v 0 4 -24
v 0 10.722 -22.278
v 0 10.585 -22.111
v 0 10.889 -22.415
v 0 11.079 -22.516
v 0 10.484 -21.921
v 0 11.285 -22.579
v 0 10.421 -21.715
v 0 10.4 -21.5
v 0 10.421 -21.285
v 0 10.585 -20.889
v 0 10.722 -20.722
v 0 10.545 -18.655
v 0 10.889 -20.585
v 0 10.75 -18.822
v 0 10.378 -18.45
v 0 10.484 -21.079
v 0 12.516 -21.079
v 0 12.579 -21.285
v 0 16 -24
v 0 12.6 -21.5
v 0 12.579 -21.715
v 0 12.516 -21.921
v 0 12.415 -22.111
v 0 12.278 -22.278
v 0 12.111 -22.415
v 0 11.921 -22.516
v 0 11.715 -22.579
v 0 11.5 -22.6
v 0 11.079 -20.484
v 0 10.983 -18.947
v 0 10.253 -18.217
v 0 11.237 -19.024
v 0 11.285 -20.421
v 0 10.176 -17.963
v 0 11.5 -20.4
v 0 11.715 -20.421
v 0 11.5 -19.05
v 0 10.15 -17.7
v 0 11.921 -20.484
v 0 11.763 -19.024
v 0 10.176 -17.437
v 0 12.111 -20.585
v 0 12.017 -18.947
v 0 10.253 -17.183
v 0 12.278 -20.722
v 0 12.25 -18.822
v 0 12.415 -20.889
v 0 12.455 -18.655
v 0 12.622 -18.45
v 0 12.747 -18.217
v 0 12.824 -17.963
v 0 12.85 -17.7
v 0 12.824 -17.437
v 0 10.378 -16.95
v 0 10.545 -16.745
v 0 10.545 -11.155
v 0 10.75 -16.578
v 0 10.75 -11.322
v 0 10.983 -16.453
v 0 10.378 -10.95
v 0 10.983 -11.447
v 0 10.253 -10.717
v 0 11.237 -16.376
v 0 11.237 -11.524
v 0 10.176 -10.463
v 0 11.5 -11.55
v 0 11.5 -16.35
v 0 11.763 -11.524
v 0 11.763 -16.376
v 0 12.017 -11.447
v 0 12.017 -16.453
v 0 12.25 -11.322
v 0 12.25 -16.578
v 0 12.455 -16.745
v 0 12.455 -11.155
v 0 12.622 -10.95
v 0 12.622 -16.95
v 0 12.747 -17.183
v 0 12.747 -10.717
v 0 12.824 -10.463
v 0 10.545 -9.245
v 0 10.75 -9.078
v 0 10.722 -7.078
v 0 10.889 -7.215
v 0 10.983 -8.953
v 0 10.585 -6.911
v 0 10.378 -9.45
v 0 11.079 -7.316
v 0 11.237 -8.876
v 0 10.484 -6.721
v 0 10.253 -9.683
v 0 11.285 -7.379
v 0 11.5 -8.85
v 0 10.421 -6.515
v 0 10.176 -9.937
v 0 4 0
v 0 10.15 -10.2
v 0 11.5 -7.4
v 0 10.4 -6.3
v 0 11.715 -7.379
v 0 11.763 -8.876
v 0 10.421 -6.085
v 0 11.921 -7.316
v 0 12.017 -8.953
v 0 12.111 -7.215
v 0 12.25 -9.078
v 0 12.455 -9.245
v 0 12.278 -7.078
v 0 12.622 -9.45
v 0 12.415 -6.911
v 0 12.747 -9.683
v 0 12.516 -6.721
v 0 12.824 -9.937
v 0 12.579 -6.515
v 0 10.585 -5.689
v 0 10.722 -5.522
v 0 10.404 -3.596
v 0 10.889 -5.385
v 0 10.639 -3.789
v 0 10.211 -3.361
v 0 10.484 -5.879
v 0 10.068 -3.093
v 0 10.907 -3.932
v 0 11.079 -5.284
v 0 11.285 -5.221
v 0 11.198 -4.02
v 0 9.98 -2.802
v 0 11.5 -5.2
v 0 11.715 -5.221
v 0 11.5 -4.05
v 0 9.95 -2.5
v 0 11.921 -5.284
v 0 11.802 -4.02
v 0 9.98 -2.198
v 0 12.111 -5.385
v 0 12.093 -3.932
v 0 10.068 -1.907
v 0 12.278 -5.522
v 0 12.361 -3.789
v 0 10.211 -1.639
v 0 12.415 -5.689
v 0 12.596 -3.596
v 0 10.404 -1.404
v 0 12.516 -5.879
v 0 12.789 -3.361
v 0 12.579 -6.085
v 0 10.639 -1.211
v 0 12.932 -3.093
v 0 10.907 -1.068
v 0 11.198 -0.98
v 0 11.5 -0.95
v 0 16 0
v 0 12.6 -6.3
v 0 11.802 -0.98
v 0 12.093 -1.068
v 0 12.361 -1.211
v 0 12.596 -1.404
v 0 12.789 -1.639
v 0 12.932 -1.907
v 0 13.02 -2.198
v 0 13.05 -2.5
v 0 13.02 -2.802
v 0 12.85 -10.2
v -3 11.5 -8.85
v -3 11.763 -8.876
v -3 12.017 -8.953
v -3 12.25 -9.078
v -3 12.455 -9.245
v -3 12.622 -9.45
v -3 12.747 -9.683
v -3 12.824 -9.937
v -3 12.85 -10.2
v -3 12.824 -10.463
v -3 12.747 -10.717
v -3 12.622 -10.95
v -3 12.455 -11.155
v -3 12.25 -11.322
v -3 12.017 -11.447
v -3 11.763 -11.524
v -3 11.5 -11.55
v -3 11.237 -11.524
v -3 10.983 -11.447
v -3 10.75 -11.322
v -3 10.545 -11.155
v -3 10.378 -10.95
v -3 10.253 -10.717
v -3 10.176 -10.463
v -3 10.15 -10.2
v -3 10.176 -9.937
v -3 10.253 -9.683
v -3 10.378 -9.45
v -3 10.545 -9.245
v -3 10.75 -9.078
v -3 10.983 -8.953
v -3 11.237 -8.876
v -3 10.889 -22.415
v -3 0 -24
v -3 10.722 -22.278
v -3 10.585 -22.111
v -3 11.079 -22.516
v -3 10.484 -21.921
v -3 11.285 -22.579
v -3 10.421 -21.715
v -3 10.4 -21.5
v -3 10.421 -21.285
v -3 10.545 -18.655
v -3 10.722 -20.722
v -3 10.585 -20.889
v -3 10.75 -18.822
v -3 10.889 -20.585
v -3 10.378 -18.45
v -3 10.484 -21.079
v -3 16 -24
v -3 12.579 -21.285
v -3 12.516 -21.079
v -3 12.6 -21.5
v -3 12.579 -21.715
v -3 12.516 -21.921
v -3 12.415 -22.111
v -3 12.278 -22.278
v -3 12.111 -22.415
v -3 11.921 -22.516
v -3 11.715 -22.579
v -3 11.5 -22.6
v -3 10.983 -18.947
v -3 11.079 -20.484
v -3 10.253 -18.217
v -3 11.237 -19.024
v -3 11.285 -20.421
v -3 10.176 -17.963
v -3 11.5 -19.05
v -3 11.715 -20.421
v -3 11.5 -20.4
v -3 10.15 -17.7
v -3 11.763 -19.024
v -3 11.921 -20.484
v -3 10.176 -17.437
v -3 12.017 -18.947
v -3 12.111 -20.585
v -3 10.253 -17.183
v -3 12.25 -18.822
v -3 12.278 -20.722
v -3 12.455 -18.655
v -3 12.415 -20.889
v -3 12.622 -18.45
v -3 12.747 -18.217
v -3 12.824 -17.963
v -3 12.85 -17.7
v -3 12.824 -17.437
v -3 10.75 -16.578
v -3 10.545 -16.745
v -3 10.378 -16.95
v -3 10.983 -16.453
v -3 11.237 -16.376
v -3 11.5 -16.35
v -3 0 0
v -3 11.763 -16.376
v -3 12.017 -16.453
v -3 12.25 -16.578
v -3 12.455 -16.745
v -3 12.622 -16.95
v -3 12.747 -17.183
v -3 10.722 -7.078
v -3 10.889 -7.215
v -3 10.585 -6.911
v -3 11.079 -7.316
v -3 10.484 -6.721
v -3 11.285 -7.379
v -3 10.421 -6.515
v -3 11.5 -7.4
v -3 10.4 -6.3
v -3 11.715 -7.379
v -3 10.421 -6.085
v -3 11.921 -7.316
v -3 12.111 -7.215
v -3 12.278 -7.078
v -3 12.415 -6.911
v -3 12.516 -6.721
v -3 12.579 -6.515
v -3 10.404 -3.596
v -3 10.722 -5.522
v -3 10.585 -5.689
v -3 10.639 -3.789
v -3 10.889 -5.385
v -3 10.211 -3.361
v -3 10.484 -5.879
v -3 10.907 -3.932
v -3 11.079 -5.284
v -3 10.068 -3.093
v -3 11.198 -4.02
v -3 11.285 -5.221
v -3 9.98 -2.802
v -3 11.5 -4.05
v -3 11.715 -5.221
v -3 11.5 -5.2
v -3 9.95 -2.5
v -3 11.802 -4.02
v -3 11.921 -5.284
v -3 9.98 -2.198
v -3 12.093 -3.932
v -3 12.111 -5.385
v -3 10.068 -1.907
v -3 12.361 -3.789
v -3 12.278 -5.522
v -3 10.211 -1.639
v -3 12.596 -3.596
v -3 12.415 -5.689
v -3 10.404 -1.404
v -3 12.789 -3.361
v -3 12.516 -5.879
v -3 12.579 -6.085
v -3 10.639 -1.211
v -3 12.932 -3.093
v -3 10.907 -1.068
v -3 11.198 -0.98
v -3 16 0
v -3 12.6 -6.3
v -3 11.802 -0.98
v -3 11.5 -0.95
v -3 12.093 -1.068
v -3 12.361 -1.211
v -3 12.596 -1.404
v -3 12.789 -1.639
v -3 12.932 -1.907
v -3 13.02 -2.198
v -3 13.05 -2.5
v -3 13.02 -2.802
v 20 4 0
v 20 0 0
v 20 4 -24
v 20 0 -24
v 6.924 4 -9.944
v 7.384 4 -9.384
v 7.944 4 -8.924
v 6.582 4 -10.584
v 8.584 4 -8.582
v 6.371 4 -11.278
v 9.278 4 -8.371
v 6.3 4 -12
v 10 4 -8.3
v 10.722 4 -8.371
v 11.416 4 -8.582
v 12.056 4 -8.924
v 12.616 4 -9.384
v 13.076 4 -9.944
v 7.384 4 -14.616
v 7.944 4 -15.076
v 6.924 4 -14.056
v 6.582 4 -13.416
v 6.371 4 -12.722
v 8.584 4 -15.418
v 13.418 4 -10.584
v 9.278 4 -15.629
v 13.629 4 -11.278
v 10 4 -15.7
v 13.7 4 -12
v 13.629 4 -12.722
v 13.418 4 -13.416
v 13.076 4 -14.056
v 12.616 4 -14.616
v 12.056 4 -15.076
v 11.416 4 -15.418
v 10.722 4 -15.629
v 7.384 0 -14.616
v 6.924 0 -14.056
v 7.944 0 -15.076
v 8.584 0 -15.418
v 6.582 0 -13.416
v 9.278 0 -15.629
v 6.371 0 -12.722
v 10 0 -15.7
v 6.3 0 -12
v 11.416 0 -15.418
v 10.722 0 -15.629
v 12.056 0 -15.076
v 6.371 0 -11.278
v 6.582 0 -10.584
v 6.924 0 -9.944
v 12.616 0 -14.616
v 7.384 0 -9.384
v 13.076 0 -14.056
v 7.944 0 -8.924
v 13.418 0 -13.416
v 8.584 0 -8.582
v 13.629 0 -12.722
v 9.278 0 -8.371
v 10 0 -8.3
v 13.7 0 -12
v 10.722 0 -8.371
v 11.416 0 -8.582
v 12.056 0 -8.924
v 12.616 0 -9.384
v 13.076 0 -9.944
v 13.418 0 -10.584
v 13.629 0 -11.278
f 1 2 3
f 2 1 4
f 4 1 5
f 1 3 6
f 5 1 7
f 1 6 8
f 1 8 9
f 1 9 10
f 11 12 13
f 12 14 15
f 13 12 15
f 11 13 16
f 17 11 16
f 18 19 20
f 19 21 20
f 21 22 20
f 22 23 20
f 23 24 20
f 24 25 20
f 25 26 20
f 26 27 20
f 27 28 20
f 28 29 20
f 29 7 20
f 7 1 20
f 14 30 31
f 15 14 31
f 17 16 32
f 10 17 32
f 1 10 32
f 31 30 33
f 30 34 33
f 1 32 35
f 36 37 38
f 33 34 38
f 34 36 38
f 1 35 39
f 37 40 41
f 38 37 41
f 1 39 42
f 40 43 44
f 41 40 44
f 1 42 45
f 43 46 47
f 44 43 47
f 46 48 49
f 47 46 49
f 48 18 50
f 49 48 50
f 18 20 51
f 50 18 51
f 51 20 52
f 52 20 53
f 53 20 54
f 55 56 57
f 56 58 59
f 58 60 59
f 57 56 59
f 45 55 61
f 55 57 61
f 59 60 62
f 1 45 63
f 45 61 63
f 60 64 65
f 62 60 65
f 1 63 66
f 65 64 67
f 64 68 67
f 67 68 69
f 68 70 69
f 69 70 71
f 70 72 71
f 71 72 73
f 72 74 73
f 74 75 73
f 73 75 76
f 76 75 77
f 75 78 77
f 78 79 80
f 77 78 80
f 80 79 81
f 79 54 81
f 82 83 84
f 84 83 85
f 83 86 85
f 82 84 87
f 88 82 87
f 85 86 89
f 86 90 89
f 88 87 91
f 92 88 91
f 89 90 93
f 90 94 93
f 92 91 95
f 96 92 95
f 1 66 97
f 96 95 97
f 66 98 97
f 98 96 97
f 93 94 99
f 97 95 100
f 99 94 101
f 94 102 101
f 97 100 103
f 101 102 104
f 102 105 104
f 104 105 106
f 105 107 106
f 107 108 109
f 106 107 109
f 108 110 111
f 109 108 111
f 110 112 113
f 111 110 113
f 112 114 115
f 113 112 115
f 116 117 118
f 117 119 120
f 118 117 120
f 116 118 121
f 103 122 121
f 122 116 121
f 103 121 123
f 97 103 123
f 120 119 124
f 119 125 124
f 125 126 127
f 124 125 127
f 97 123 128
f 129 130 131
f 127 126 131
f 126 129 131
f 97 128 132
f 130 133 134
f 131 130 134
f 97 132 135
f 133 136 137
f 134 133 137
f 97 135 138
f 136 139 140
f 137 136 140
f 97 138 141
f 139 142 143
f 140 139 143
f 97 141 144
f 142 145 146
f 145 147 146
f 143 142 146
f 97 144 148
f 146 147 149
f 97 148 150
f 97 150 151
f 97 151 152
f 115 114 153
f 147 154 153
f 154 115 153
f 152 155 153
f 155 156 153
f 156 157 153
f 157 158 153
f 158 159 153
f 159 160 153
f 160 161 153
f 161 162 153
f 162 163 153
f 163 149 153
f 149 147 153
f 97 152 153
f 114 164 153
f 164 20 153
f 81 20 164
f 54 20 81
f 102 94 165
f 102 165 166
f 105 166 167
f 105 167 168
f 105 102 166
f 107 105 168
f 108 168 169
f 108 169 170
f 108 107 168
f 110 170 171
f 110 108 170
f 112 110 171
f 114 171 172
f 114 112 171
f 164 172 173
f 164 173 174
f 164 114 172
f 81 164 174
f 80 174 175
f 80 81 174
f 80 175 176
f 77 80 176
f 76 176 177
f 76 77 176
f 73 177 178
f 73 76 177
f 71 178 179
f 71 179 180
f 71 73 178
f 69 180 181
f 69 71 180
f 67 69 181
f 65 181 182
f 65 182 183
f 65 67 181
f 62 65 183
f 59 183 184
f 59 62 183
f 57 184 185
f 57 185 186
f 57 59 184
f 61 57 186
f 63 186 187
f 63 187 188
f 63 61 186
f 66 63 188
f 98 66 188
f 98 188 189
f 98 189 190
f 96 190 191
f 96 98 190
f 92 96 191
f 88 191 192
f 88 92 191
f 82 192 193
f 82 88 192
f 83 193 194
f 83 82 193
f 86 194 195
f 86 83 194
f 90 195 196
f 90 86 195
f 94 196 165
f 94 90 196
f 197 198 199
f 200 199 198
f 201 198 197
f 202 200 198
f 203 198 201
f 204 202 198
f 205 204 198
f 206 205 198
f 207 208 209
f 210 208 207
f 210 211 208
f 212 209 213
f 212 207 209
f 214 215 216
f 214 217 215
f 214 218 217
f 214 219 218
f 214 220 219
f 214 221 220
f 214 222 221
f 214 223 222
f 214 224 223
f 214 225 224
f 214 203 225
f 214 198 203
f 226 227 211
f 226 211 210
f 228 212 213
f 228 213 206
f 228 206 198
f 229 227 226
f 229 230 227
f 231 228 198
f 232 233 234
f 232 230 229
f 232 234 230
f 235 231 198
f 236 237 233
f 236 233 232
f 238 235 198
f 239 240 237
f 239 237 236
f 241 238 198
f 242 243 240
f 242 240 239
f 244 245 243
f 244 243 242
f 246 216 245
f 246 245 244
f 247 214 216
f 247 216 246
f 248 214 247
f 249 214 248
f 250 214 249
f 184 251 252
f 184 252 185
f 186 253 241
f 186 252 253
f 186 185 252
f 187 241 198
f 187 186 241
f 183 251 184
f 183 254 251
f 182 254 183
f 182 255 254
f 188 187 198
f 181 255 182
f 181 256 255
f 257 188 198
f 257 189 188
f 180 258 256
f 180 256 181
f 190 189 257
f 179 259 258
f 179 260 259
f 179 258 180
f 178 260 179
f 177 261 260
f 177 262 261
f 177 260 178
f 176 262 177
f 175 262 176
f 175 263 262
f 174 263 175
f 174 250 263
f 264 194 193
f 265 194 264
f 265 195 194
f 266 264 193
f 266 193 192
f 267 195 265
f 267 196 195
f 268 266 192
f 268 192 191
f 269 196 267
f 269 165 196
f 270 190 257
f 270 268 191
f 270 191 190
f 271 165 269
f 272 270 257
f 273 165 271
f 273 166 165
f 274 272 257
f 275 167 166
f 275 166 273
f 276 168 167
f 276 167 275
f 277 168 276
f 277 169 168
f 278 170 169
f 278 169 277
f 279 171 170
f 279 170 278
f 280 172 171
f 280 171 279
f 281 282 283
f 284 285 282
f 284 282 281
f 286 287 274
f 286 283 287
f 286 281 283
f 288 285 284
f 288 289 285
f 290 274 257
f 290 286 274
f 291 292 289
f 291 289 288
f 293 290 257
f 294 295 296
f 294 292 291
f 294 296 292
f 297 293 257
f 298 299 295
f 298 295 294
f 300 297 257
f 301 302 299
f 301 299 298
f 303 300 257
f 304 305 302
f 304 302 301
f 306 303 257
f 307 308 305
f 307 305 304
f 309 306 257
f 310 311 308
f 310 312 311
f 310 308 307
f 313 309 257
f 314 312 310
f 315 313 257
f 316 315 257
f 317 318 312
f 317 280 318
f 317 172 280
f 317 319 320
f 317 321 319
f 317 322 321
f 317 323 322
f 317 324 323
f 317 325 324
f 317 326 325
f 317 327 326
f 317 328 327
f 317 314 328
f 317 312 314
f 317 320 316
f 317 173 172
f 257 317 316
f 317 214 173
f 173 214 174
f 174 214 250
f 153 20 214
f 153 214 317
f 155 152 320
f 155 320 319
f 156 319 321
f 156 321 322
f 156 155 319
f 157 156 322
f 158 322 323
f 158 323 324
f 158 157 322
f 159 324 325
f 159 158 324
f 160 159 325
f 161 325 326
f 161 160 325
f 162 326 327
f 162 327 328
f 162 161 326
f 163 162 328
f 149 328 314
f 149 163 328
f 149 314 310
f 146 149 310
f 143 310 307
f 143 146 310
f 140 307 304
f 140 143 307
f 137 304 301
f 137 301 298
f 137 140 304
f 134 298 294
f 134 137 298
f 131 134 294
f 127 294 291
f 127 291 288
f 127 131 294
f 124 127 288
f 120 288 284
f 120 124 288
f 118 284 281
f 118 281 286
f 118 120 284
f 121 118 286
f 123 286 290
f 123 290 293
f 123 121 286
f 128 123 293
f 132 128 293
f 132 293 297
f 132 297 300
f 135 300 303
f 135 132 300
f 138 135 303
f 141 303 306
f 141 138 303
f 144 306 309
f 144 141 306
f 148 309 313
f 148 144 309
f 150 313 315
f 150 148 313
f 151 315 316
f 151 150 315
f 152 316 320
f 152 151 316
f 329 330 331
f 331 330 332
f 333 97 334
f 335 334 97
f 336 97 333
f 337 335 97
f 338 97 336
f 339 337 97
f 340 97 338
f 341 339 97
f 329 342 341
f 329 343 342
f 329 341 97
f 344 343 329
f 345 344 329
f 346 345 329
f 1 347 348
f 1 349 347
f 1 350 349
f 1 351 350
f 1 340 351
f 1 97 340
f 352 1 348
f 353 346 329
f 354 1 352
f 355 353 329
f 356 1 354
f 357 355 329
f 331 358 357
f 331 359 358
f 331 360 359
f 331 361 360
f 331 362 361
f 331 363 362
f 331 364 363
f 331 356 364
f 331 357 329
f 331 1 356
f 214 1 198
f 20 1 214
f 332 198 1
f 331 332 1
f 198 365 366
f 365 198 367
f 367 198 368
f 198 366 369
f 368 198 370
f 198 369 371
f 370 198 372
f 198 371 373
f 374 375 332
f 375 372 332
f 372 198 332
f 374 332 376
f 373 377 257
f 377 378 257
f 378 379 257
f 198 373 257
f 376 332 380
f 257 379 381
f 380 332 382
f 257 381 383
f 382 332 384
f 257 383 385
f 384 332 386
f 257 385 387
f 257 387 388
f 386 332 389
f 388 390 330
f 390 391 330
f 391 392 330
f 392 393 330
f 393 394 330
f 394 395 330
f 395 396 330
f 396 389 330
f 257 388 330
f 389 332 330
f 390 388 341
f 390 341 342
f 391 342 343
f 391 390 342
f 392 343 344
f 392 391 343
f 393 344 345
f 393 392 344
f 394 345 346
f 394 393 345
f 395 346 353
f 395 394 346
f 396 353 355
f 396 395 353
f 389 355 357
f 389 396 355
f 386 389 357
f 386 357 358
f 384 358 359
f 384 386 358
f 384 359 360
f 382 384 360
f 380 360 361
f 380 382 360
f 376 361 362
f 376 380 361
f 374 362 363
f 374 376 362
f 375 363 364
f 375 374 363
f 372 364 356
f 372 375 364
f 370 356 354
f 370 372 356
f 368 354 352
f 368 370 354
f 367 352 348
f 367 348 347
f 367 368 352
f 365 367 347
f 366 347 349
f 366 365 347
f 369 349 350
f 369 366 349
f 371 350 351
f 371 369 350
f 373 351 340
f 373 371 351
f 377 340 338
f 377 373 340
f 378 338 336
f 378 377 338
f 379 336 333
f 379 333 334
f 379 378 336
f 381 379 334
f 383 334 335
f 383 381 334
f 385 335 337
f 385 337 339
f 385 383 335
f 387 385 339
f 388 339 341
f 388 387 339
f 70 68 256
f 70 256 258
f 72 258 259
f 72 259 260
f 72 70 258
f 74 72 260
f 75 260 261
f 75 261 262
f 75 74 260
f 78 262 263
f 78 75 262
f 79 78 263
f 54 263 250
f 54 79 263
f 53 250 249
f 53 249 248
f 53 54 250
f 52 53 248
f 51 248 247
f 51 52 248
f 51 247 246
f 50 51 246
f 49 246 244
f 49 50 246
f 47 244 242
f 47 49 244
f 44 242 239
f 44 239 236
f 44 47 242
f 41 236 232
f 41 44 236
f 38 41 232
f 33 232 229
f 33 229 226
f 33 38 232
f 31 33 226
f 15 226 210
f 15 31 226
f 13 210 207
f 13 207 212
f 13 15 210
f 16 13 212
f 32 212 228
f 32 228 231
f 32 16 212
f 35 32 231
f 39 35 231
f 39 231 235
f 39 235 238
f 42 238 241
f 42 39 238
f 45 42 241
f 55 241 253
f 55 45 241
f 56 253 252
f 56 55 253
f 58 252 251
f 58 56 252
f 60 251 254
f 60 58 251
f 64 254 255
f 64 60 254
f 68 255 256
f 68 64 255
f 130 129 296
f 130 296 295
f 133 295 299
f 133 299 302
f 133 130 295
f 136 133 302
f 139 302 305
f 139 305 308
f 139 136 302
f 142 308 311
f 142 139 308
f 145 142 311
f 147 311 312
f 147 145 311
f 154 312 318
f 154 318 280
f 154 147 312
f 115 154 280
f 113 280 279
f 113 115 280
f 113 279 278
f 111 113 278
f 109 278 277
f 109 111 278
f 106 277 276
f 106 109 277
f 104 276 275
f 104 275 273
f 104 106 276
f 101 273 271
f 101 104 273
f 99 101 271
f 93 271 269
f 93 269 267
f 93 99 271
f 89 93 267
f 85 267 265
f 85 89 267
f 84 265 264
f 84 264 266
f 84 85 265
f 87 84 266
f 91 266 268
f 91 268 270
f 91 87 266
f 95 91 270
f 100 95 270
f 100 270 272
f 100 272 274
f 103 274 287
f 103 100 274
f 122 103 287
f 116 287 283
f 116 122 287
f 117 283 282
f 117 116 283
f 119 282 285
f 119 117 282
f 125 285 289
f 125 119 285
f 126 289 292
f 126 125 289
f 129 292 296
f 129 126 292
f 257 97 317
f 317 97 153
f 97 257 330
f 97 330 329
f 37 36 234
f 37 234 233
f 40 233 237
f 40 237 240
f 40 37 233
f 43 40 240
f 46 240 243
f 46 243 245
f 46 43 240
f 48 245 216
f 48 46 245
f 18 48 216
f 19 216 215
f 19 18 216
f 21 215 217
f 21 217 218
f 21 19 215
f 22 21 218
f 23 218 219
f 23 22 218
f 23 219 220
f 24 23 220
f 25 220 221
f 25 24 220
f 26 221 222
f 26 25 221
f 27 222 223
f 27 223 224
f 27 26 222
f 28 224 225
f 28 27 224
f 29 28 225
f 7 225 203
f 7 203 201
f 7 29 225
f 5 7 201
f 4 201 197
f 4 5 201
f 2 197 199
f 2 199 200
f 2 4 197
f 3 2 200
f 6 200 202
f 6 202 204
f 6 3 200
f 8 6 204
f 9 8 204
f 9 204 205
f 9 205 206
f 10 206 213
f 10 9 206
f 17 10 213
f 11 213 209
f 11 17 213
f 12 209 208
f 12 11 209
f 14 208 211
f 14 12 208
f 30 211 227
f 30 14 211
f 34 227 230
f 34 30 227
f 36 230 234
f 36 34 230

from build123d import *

# Parameters (mm, degrees)
SKETCH_1_W      = 20
SKETCH_1_H      = 24
SKETCH_1_R      = 3.7
EXTRUDE_1_DEPTH = 4
SKETCH_2_W      = 24
SKETCH_2_H      = 16
SKETCH_2_R      = 1.1
SKETCH_2_R_2    = 1.35
SKETCH_2_R_3    = 1.55
EXTRUDE_2_DEPTH = 3


with BuildPart() as part:
    # 草图1 → 凸台-拉伸1 (new body)
    with BuildSketch(Plane(origin=(0, 0, 0), x_dir=(1, 0, 0), z_dir=(0, 1, 0))):
        with Locations((10, 12)):
            Rectangle(SKETCH_1_W, SKETCH_1_H)
        with Locations(Location((10, 12, 0), (0, 0, 270))):
            Circle(SKETCH_1_R, mode=Mode.SUBTRACT)
    extrude(amount=EXTRUDE_1_DEPTH)

    # 草图2 → 凸台-拉伸2 (add)
    with BuildSketch(Plane.ZY):
        with Locations((-12, 8)):
            Rectangle(SKETCH_2_W, SKETCH_2_H)
        with Locations((-21.5, 11.5)):
            Circle(SKETCH_2_R, mode=Mode.SUBTRACT)
        with Locations((-17.7, 11.5)):
            Circle(SKETCH_2_R_2, mode=Mode.SUBTRACT)
        with Locations((-6.3, 11.5)):
            Circle(SKETCH_2_R, mode=Mode.SUBTRACT)
        with Locations((-2.5, 11.5)):
            Circle(SKETCH_2_R_3, mode=Mode.SUBTRACT)
        with Locations((-10.2, 11.5)):
            Circle(SKETCH_2_R_2, mode=Mode.SUBTRACT)
    extrude(amount=EXTRUDE_2_DEPTH)


solid = part.part
